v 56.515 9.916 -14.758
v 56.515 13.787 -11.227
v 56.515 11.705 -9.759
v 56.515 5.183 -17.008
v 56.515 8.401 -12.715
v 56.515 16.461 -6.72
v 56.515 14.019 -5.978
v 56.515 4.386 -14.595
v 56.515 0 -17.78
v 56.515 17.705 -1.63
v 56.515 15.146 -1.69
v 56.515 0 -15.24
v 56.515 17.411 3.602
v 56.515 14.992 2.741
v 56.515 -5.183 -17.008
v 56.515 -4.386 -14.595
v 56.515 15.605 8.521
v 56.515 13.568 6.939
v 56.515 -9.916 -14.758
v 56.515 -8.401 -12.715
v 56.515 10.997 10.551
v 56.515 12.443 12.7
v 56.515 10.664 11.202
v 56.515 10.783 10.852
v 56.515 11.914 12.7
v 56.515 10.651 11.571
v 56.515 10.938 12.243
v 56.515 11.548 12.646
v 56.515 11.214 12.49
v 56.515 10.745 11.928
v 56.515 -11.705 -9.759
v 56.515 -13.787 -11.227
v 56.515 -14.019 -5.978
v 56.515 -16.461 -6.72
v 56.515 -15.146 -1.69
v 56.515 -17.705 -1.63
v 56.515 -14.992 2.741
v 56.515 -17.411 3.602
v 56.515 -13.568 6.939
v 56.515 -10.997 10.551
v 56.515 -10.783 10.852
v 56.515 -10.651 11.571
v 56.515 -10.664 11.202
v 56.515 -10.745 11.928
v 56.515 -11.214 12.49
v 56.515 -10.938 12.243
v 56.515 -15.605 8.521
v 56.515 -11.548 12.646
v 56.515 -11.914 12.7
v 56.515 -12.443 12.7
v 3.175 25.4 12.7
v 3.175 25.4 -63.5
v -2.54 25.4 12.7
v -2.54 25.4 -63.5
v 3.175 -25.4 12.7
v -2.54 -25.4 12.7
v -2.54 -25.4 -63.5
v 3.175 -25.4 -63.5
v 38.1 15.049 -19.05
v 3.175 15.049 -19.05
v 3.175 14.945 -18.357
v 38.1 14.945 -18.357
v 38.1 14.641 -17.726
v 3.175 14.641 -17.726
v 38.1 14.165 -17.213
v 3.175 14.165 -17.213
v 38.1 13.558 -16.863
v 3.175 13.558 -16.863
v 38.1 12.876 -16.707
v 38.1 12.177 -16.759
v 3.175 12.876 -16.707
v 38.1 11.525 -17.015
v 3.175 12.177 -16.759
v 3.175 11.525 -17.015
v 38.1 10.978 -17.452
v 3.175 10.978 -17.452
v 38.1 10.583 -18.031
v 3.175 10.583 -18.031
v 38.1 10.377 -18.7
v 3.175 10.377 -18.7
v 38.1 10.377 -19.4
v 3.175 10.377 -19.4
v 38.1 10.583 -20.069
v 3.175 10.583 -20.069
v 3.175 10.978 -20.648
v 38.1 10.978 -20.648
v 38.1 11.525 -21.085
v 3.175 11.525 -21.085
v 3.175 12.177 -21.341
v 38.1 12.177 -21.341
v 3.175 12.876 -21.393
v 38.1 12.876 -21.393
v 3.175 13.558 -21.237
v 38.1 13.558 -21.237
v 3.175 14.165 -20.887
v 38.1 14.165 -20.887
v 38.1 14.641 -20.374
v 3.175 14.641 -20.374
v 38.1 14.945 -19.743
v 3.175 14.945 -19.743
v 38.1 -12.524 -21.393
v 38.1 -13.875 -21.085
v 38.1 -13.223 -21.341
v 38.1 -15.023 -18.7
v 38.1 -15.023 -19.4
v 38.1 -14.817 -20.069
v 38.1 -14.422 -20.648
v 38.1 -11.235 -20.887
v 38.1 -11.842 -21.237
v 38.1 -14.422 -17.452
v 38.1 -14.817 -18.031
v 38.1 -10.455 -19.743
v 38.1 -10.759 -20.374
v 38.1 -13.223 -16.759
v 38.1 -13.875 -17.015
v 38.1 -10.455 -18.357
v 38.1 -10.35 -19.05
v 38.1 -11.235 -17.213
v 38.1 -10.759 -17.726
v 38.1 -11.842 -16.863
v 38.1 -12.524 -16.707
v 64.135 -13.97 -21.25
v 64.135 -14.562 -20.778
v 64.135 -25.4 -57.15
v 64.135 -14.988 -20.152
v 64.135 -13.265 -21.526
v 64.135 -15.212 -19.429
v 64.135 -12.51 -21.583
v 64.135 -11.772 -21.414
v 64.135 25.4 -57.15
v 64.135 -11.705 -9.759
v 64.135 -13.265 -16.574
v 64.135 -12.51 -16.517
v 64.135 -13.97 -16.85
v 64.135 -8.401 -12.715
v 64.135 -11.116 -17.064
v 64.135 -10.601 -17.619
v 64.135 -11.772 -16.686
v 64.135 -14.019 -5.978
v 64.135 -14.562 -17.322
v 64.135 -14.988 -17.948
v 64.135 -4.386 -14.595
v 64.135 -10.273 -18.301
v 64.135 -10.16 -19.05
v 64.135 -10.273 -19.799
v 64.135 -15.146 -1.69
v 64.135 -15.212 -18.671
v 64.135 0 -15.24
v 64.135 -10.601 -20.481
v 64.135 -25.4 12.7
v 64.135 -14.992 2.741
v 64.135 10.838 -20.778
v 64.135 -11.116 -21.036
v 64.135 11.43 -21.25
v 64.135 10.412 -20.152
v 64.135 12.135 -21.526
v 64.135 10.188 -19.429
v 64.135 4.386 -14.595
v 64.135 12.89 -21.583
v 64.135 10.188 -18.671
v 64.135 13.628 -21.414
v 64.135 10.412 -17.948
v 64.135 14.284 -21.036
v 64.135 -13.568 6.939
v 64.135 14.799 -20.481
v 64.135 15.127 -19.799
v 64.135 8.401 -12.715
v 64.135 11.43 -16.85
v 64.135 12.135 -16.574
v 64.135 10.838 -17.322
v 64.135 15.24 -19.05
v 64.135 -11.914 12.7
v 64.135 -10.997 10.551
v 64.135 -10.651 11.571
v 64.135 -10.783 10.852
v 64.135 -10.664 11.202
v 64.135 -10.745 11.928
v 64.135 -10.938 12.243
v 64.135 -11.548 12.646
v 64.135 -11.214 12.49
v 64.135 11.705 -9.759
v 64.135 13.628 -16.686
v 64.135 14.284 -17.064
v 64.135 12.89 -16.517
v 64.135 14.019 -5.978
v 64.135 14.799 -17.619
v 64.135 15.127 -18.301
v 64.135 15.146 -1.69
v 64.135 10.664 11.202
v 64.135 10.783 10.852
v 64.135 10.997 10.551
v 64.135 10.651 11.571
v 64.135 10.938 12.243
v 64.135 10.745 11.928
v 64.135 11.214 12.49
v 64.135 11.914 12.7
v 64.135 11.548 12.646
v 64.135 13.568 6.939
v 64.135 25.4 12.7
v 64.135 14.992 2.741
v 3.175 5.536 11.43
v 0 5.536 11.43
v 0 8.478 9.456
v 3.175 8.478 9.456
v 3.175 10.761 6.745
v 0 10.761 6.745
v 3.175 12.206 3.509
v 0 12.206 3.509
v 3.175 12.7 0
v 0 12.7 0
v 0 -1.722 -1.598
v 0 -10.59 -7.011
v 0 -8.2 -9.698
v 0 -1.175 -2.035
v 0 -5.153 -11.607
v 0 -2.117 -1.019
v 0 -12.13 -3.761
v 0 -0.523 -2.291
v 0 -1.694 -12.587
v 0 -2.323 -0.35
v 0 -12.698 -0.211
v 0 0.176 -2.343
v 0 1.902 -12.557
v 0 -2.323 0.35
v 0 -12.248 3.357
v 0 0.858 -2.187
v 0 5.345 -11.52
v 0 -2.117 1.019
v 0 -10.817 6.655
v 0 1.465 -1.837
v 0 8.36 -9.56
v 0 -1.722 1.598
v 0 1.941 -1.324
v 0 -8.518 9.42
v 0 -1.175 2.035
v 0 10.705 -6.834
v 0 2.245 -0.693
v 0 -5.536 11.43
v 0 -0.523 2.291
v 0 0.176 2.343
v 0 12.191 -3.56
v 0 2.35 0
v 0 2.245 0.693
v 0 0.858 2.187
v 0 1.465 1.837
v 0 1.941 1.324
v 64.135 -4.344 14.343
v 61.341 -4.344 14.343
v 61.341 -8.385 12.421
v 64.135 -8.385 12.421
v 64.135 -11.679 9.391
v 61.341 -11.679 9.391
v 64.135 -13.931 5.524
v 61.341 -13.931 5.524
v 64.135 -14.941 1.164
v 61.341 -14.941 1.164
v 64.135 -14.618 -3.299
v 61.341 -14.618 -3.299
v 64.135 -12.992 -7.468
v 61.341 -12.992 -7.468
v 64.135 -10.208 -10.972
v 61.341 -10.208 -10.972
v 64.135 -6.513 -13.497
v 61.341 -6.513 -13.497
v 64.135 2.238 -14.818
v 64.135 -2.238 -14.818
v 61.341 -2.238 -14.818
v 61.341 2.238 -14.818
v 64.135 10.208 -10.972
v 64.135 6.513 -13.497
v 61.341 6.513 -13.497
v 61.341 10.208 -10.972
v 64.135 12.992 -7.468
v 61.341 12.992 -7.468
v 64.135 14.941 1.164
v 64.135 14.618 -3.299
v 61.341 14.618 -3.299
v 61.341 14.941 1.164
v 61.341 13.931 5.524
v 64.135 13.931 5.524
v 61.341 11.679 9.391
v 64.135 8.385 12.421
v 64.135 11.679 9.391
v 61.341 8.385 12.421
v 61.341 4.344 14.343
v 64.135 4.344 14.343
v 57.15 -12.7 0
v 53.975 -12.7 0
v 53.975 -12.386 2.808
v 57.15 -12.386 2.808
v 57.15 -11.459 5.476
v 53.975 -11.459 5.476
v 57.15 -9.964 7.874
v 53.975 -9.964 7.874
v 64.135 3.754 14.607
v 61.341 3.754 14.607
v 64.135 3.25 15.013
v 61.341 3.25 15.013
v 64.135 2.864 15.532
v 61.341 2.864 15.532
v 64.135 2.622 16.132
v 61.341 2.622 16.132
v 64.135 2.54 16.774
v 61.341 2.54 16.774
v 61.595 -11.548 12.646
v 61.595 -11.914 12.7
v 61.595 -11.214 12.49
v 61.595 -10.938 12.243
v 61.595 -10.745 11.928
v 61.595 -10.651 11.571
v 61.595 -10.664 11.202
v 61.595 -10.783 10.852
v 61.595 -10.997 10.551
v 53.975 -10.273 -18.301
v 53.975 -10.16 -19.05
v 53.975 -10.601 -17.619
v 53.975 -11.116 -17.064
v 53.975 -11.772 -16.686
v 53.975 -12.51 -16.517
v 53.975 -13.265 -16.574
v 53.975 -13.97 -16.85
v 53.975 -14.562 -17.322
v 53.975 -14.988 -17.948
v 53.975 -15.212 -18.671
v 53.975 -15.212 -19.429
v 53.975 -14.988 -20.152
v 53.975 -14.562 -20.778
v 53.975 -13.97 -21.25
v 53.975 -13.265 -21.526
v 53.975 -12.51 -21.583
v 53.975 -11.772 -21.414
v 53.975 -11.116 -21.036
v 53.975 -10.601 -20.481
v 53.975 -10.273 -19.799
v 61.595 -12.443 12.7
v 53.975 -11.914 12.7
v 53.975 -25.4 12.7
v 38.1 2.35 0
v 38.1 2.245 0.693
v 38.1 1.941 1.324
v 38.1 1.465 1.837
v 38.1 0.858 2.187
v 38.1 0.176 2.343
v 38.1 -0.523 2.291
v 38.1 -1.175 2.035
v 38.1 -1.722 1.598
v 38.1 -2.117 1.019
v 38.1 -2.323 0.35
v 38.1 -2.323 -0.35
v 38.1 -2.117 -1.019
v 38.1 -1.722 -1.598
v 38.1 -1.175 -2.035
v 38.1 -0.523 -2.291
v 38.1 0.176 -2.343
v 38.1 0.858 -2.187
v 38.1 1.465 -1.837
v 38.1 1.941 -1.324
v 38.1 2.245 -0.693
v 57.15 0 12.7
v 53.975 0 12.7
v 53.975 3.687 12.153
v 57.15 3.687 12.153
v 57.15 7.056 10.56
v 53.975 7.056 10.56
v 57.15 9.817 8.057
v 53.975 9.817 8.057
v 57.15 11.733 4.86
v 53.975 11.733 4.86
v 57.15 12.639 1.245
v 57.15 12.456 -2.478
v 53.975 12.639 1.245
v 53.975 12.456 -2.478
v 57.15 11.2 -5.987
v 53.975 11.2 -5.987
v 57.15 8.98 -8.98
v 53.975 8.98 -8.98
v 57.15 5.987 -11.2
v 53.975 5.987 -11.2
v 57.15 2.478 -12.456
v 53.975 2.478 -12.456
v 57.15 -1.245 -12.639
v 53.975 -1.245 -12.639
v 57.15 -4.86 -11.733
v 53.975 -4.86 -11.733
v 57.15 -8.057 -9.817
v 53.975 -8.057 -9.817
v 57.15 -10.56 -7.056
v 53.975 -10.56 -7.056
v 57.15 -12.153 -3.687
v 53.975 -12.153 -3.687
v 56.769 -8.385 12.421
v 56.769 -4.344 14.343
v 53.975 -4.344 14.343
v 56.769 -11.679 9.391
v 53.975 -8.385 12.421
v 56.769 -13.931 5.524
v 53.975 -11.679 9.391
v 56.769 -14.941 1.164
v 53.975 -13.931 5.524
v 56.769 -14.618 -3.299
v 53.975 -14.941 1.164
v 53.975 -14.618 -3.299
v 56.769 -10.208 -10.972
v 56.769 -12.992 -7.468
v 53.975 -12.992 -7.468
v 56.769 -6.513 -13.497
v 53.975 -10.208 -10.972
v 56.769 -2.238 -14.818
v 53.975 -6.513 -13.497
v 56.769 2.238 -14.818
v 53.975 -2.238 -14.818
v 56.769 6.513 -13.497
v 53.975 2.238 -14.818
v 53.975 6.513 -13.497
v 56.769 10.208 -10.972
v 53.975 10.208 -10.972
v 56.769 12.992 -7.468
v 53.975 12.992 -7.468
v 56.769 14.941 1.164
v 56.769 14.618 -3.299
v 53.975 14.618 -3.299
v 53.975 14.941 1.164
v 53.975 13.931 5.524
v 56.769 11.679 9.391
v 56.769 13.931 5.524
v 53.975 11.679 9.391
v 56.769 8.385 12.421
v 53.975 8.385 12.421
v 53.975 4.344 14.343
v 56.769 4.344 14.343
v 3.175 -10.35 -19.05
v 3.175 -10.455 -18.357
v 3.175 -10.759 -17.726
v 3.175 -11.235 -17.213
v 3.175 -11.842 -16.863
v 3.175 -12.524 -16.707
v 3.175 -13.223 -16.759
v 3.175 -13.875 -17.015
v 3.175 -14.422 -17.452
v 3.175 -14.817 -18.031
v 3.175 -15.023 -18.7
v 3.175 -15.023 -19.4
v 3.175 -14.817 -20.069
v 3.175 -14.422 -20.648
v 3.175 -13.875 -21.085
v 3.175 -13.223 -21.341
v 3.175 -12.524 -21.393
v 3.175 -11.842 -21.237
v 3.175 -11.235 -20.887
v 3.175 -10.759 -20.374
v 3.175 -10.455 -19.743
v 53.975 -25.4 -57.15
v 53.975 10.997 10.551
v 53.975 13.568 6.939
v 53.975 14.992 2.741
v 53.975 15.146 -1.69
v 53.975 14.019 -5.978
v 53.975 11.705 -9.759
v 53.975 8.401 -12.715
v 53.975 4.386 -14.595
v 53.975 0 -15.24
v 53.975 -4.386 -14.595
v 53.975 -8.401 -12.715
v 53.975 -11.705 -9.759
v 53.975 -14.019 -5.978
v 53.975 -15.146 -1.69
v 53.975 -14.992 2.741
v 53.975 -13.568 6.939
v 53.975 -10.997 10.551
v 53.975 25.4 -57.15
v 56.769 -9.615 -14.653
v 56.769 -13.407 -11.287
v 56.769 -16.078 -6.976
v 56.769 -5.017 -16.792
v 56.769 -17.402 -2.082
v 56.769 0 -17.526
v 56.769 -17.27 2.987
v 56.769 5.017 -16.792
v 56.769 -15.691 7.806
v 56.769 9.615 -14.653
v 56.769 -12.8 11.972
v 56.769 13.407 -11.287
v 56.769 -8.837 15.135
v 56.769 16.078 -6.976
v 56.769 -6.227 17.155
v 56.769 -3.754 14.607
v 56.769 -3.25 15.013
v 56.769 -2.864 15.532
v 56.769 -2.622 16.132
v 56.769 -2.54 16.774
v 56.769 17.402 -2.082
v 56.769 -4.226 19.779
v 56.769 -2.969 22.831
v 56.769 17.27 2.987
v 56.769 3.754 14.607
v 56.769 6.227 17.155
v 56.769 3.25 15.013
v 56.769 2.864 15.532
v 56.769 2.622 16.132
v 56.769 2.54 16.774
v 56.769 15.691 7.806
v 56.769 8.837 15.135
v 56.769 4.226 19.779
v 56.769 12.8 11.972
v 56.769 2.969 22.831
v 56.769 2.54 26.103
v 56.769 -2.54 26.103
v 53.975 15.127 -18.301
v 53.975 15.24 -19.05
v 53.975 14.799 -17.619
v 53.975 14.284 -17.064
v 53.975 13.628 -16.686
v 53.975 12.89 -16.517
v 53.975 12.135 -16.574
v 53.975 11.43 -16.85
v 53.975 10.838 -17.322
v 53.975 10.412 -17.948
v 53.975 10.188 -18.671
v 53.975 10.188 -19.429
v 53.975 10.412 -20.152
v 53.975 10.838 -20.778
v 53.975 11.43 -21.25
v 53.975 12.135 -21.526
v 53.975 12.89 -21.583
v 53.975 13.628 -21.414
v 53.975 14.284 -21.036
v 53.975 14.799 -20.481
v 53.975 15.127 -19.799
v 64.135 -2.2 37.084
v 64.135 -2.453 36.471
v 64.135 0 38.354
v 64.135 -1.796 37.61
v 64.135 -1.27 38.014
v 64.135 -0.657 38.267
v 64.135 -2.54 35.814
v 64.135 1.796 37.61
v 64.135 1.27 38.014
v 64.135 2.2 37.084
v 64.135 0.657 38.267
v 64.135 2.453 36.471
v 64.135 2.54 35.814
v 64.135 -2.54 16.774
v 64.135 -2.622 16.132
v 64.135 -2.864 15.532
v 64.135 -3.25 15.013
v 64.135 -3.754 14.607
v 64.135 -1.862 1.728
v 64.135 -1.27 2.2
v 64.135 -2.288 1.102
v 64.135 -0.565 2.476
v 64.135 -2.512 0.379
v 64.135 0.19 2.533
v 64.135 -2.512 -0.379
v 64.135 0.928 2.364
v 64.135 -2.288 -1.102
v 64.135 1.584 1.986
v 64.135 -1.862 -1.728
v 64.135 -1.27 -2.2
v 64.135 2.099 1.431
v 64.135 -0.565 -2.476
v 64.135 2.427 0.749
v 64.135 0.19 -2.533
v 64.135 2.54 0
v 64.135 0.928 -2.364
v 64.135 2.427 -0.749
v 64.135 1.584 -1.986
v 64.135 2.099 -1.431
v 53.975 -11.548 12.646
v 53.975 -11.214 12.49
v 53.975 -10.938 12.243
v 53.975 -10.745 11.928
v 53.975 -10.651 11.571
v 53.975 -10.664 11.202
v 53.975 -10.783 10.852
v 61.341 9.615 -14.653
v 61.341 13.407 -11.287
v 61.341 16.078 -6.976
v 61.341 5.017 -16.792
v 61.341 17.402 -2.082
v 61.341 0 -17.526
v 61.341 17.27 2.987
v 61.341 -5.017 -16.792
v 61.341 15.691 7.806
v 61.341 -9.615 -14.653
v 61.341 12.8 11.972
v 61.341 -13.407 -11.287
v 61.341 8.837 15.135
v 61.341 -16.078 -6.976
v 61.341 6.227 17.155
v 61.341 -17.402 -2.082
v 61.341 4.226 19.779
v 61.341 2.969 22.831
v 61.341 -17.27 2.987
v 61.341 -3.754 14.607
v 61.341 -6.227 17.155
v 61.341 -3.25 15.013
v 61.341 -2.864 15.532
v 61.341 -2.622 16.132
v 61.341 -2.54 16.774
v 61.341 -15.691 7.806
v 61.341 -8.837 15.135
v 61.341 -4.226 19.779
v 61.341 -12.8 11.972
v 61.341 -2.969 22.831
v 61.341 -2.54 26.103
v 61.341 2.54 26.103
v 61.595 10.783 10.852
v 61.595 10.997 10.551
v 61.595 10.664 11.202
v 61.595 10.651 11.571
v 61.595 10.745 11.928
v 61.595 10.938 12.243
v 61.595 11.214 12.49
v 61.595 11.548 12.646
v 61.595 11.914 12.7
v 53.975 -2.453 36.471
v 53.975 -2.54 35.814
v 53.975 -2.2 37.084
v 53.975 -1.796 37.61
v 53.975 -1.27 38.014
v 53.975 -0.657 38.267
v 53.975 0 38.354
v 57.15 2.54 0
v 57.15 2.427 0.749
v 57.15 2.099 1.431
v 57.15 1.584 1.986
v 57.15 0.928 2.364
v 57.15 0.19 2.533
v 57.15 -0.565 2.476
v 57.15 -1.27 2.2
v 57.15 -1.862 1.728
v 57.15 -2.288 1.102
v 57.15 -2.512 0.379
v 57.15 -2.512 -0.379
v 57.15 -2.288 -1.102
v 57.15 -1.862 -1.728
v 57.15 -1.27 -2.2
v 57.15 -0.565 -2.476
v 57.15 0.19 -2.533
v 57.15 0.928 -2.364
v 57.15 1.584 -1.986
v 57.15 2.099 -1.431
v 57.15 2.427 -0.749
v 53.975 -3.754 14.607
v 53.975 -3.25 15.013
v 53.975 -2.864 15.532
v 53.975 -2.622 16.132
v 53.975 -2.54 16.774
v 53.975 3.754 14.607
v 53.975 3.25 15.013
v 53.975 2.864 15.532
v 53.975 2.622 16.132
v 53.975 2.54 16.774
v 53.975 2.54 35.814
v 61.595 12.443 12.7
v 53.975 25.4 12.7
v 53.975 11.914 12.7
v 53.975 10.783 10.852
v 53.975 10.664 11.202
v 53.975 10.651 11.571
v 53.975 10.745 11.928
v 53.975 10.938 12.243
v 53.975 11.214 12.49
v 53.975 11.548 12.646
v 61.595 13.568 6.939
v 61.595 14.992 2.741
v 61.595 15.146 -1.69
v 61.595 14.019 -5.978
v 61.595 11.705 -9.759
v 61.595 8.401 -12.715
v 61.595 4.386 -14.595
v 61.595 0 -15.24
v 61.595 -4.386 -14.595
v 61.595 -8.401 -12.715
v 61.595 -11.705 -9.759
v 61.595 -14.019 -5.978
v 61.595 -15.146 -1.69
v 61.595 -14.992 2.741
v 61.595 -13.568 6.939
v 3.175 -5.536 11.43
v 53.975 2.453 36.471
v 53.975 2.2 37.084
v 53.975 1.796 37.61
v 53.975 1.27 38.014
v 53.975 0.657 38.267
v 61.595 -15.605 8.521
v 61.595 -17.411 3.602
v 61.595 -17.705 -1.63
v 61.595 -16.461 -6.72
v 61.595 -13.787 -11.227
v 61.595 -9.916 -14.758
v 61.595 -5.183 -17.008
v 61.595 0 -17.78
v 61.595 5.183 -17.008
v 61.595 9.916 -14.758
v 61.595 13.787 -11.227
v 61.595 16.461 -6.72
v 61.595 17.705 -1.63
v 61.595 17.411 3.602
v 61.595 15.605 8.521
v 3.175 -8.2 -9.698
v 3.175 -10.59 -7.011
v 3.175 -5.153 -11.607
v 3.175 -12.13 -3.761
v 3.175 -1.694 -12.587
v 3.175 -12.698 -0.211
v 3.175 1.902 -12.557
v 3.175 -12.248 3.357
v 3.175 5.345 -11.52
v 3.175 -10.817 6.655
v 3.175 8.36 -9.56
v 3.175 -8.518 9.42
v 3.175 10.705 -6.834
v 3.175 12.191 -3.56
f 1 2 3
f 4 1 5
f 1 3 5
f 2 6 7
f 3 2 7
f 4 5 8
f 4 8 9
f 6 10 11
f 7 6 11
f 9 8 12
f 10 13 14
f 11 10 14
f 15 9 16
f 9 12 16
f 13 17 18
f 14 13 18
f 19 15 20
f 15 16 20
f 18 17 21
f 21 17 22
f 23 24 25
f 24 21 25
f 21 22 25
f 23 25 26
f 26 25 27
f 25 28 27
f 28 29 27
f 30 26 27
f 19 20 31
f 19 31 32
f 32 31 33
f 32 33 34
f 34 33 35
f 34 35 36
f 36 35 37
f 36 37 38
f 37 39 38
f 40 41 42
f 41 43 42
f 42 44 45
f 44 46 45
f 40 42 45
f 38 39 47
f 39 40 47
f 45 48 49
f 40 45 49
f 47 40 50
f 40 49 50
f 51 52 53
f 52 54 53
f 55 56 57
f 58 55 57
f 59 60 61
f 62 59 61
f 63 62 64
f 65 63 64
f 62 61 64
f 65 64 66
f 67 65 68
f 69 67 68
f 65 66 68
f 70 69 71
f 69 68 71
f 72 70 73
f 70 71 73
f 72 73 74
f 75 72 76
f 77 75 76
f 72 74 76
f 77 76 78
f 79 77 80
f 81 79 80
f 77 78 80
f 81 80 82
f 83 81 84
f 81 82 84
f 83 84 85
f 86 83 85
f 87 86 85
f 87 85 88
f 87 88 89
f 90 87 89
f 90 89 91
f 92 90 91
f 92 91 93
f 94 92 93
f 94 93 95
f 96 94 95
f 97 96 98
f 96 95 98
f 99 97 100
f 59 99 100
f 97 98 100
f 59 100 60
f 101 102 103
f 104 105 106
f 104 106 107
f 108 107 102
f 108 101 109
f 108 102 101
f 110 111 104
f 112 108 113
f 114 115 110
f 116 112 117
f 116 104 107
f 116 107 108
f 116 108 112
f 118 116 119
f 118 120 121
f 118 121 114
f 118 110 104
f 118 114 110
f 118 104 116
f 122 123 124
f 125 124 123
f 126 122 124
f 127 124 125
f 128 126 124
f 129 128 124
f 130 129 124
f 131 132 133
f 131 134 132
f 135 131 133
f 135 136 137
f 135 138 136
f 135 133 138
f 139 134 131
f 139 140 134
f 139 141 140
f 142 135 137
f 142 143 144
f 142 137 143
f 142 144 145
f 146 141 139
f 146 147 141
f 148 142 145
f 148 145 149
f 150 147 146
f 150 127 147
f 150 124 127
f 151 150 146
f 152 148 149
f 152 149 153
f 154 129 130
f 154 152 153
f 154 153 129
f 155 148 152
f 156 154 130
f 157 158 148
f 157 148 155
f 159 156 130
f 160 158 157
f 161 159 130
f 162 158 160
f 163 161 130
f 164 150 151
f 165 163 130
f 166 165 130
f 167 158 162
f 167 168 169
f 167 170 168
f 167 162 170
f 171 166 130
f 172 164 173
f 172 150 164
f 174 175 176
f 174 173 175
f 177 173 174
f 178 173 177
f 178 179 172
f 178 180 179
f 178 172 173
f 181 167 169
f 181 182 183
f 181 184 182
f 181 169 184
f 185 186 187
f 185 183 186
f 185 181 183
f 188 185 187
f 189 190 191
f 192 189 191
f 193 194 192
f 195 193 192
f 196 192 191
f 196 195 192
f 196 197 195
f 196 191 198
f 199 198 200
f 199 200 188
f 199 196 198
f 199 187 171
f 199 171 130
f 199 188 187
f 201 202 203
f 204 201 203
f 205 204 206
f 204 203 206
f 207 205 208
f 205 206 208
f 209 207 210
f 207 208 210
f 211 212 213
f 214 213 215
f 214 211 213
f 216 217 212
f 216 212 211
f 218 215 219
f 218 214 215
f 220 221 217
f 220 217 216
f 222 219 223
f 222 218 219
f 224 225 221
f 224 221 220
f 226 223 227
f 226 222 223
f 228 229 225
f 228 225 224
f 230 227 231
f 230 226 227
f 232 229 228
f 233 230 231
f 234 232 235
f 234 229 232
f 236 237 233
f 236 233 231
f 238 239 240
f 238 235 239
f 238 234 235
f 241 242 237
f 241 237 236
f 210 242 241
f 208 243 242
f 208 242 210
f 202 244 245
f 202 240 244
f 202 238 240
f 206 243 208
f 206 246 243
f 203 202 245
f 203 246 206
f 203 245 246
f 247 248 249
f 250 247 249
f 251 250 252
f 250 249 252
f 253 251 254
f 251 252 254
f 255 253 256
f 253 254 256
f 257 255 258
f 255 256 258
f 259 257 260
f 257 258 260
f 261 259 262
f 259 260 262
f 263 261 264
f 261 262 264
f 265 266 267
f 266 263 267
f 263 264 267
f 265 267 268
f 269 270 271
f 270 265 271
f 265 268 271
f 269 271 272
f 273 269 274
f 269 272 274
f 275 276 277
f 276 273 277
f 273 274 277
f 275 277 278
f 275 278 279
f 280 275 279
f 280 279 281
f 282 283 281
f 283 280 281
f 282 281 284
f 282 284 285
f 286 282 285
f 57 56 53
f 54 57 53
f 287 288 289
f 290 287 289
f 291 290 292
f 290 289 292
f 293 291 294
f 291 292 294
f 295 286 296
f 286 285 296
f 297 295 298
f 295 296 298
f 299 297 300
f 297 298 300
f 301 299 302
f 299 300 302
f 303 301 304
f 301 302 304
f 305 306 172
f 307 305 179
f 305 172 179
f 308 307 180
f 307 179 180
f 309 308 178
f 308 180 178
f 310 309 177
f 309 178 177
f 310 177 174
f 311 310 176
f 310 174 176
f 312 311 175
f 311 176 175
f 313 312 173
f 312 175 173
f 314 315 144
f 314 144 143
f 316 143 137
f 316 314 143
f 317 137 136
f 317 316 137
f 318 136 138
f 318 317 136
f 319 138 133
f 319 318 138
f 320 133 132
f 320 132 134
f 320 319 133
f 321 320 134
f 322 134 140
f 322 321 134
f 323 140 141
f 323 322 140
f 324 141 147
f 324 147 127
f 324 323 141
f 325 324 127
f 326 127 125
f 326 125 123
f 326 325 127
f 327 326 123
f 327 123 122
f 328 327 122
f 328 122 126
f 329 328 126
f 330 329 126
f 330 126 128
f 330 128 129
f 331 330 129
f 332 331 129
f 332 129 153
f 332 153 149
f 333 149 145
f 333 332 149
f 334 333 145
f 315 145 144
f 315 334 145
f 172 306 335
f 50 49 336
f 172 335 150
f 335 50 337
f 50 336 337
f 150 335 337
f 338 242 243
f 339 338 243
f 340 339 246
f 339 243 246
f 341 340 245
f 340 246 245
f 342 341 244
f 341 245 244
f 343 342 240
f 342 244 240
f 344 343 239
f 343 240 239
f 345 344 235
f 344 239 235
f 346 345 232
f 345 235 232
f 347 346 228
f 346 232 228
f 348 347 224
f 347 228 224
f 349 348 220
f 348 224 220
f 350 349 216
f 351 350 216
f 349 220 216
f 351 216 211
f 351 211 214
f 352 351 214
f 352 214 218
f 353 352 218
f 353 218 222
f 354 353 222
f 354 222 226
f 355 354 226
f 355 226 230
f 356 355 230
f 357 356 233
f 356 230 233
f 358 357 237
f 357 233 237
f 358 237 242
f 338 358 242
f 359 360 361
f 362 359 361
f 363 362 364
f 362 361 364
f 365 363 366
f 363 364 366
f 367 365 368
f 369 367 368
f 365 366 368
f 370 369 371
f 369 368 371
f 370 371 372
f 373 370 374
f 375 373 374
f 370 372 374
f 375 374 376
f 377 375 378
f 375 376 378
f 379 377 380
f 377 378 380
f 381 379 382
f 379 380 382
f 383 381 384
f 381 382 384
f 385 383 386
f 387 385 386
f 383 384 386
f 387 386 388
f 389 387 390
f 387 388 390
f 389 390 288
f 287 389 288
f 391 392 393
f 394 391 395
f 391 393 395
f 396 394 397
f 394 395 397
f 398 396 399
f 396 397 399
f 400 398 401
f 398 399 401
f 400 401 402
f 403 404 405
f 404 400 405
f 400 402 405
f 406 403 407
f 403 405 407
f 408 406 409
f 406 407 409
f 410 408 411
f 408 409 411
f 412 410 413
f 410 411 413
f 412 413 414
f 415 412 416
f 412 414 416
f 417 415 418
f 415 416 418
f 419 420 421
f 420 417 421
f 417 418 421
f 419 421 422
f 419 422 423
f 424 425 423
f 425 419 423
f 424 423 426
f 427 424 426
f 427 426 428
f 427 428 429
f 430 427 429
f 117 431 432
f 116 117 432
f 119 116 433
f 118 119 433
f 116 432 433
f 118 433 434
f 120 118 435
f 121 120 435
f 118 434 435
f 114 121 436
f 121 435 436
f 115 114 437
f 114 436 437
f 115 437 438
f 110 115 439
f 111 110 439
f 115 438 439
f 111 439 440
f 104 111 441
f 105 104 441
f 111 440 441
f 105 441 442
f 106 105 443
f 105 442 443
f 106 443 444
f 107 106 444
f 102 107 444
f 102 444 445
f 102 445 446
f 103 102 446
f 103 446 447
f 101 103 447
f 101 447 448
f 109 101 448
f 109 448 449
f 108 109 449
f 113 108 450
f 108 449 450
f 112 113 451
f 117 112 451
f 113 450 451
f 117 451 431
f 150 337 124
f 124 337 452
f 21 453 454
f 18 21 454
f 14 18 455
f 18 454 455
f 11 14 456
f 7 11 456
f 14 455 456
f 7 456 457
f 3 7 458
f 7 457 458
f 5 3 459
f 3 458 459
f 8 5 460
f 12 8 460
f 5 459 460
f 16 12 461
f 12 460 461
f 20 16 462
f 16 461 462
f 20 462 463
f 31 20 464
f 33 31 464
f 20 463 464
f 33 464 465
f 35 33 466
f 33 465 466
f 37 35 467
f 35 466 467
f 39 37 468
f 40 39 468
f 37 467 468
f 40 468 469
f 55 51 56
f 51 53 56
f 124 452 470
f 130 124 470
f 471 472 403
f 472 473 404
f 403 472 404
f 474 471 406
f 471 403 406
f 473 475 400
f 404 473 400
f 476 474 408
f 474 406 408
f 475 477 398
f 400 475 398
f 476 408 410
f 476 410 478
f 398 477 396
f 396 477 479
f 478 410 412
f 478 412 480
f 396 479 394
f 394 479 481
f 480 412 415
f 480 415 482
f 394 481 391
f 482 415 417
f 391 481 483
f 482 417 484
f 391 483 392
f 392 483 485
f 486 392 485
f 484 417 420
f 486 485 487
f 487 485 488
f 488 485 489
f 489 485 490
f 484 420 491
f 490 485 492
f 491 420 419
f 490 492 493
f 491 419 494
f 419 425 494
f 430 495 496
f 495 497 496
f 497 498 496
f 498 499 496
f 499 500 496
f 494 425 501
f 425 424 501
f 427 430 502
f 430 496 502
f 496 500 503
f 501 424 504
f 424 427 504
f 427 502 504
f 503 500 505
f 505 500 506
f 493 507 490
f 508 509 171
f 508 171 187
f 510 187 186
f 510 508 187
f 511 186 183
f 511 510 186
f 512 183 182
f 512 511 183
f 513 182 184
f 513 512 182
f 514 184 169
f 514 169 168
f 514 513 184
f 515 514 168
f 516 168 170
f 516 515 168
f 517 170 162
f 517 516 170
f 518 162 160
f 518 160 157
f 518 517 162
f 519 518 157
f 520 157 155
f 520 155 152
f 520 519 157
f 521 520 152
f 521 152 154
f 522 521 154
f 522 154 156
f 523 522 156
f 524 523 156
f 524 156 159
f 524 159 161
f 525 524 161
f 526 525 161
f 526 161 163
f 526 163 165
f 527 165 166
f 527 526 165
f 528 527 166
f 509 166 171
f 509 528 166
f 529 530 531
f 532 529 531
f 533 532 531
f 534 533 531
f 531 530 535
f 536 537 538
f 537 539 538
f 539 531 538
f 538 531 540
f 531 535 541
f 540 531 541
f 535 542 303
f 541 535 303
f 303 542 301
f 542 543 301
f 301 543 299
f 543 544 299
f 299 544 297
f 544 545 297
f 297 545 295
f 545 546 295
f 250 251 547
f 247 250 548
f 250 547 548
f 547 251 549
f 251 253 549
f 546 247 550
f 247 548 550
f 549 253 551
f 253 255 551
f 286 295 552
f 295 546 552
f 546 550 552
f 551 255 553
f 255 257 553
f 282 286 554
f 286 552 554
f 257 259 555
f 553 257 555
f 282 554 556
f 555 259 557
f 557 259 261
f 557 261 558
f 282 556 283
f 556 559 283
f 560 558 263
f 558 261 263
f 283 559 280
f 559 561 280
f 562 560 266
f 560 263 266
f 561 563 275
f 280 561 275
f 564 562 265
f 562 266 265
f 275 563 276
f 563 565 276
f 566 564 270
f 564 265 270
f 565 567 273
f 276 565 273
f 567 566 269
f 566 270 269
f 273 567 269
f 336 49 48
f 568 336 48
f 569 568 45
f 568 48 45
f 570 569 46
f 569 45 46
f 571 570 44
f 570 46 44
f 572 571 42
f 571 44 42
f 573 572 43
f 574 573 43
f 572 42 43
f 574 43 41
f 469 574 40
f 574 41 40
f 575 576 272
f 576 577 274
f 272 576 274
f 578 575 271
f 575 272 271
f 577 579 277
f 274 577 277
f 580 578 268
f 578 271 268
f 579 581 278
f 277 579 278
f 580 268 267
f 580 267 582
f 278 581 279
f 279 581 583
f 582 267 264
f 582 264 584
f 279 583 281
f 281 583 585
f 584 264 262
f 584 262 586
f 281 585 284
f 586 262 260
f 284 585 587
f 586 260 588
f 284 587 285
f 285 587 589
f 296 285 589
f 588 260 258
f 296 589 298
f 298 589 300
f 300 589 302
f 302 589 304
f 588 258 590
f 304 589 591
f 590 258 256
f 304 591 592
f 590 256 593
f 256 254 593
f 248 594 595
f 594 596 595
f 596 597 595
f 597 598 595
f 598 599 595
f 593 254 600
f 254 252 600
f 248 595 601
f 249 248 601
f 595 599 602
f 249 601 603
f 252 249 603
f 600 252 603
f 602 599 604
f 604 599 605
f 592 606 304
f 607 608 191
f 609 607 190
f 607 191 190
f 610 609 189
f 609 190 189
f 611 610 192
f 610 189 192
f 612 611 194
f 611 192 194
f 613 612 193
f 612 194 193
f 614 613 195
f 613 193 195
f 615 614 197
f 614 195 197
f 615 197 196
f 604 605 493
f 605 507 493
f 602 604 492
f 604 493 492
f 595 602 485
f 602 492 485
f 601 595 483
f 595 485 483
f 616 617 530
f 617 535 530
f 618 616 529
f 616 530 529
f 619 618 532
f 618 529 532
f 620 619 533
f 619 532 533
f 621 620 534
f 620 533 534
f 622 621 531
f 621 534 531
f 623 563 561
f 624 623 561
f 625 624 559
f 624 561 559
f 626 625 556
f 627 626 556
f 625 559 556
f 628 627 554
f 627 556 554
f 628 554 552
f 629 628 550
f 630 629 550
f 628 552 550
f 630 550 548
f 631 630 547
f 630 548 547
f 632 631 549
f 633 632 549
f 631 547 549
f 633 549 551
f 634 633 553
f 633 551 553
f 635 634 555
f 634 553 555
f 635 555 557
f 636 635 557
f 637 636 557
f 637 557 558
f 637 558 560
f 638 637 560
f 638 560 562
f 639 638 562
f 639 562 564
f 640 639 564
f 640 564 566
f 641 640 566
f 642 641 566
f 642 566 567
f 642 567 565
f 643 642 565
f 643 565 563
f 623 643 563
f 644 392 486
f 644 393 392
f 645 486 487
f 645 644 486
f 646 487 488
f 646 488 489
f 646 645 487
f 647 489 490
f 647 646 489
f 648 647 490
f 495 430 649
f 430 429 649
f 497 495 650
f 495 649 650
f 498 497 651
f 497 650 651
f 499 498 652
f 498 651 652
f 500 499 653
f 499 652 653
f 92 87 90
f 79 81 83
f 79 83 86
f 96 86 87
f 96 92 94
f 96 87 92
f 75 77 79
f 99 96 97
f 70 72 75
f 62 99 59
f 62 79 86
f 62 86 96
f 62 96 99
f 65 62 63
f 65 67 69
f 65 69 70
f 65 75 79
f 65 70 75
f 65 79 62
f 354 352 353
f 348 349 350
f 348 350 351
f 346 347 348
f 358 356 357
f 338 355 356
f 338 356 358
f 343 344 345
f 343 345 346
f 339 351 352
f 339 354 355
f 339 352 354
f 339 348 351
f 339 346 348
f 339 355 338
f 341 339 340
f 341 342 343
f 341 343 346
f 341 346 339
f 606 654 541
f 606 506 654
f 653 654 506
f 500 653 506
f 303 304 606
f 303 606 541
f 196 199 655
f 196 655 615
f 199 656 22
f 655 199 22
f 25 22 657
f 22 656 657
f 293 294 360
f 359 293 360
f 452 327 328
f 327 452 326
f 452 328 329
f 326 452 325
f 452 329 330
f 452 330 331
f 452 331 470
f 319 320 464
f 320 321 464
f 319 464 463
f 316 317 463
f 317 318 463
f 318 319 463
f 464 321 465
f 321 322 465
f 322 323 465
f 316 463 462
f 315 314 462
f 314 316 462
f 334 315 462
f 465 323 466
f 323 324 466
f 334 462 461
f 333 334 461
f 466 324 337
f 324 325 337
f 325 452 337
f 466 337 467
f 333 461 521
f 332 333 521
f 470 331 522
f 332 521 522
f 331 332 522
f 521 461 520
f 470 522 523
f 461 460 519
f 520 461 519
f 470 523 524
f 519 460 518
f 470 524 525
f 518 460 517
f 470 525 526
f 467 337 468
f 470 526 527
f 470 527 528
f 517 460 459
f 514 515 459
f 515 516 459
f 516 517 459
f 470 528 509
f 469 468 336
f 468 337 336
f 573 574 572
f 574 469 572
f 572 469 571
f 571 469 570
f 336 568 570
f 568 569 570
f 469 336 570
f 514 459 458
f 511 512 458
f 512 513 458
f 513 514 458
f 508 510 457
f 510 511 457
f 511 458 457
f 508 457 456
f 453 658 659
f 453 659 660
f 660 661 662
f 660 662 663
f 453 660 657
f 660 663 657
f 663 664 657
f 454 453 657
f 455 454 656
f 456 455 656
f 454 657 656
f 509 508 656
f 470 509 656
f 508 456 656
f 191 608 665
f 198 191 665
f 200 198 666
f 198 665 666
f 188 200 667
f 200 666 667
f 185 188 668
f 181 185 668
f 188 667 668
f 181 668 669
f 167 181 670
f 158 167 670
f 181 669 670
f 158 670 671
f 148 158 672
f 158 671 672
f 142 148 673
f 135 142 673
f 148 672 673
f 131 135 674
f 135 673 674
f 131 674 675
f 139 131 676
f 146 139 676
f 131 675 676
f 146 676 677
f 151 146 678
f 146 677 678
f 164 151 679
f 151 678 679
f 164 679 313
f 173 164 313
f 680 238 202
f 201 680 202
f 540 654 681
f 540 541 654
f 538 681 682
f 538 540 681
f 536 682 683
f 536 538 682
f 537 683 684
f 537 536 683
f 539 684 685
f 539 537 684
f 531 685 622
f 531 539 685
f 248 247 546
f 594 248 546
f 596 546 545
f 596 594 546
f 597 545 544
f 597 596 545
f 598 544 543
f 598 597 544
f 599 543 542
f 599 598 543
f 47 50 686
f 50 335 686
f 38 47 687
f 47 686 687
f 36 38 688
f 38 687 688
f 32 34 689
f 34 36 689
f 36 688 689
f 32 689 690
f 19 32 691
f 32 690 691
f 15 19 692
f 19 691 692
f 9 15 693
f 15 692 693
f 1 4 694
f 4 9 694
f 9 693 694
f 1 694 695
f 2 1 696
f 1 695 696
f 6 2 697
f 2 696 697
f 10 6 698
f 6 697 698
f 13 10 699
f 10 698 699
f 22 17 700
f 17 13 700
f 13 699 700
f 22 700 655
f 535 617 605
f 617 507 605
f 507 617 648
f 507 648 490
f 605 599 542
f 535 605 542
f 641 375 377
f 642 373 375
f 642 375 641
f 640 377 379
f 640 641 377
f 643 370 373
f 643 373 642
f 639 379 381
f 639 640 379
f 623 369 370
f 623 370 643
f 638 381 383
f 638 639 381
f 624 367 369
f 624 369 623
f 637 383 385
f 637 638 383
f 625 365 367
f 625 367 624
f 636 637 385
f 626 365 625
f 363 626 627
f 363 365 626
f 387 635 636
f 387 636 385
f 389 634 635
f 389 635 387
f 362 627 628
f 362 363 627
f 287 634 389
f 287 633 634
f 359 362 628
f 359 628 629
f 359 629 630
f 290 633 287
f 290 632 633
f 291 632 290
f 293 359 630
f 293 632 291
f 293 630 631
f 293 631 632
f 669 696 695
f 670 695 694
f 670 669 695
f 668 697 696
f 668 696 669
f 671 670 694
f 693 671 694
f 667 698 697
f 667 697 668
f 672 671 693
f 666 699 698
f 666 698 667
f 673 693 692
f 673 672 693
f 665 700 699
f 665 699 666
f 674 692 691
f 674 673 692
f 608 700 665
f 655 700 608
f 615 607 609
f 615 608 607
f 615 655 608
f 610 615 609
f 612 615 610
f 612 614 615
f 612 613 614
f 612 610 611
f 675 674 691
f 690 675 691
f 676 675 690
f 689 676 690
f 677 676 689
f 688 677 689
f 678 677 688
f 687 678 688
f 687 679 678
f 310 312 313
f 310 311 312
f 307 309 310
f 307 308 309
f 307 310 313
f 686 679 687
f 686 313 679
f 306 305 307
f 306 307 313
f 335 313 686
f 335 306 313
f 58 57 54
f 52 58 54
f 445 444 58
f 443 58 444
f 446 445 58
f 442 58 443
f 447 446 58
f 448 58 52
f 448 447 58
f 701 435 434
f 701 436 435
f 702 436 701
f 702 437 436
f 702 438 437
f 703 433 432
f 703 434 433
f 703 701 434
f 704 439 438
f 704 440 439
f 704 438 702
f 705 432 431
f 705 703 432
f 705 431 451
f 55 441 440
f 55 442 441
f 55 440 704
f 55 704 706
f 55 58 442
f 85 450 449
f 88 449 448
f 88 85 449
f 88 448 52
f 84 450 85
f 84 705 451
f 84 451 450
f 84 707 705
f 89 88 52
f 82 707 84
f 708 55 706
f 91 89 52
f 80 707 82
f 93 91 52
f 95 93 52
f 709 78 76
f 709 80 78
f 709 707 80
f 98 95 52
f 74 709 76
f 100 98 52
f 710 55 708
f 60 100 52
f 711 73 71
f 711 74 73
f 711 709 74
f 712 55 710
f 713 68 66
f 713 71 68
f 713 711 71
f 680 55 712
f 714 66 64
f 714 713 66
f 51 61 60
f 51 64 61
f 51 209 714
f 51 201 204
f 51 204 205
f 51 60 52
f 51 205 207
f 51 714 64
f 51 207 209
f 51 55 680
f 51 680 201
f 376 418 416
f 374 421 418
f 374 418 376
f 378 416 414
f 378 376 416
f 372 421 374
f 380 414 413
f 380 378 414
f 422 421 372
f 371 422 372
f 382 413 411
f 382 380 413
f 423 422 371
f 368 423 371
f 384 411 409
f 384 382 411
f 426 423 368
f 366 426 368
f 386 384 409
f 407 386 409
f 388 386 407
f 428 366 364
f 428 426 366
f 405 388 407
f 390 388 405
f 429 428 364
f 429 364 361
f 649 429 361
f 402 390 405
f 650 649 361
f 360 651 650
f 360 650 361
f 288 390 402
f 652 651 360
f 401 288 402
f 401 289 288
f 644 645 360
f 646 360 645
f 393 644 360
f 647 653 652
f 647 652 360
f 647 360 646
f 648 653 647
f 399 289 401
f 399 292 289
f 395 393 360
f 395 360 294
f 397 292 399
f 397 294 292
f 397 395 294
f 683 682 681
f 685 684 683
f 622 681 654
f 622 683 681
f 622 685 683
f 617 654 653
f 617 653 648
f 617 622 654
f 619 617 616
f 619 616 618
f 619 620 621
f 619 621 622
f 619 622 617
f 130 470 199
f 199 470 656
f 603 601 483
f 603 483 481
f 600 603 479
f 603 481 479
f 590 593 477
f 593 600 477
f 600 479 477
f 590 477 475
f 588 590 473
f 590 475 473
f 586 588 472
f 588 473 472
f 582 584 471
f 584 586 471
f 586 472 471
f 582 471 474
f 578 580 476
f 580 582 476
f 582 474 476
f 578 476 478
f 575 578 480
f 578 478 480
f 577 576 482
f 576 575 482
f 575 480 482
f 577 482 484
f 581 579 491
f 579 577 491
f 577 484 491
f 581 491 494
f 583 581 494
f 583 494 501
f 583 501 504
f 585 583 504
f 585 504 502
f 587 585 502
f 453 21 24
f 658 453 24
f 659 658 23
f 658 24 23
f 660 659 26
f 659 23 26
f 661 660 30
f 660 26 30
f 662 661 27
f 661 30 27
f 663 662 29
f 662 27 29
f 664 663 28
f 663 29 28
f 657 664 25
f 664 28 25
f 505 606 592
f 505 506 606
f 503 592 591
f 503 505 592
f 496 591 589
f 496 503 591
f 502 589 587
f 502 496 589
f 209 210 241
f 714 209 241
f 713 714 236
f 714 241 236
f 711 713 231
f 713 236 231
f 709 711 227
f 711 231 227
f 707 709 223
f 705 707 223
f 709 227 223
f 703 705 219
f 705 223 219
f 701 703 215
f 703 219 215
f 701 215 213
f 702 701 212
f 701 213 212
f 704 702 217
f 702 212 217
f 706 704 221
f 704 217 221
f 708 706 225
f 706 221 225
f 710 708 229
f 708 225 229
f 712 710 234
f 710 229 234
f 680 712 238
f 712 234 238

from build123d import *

# Parameters (mm, degrees)
F0_R      = 2.3495
F1_DEPTH  = 38.1
F2_W      = 50.8
F2_H      = 76.2
F3_DEPTH  = 2.54
F5_DEPTH  = 3.175
F6_R      = 2.3495
F7_DEPTH  = 34.925
F9_R      = 2.54
F10_DEPTH = 10.16
F11_R     = 1.27
F12_W     = 5.08
F12_H     = 9.2631512689
F14_W     = 2.54
F14_H     = 14.986
F16_R     = 2.54
F17_DEPTH = 10.16
F18_R     = 2.54
F19_DEPTH = 3.175
F21_W     = 10.16
F21_H     = 5.08
F22_DEPTH = 25.4
F23_R     = 2.54
F24_R     = 12.7
F25_R     = 2.53999


# Not quite as in the source:
# - a fillet or chamfer is up to 0.001 mm smaller than in the source, because OpenCascade refuses the exact size
# - a feature names something its author has since deleted; it is built from what else it names


with BuildPart() as f1:
    # F0 (on Right) → F1 (new body)
    with BuildSketch(Plane.YZ):
        Circle(F0_R)
    extrude(amount=F1_DEPTH)

    # F2 (on Right) → F3 (join)
    with BuildSketch(Plane.YZ):
        with Locations((0, -25.4)):
            Rectangle(F2_W, F2_H)
    extrude(amount=-F3_DEPTH)

    # F4 (on face) → F5 (join)
    with BuildSketch(Plane.YZ):
        Polygon((25.4, 12.7), (0, 12.7), (-25.4, 12.7), (-25.4, -63.5), (25.4, -63.5), align=None)
        with BuildLine():
            ThreePointArc((5.5358016583, 11.43), (10.7609172718, 6.7448246434), (12.7, 0))
            ThreePointArc((12.7, 0), (-6.7448246434, -10.7609172718), (-5.5358016583, 11.43))
            ThreePointArc((-5.5358016583, 11.43), (-2.8398063314, 12.3784288179), (0, 12.7))
            ThreePointArc((0, 12.7), (2.8398063314, 12.3784288179), (5.5358016583, 11.43))
        make_face(mode=Mode.SUBTRACT)
        with BuildLine():
            Line((-5.5358016583, 11.43), (5.5358016583, 11.43))
            ThreePointArc((5.5358016583, 11.43), (2.8398063314, 12.3784288179), (0, 12.7))
            ThreePointArc((0, 12.7), (-2.8398063314, 12.3784288179), (-5.5358016583, 11.43))
        make_face()
    extrude(amount=F5_DEPTH)

    # F6 (on face) → F7 (join, through all)
    with BuildSketch(Plane.YZ.offset(3.175)):
        with Locations((-12.7, -19.05)):
            Circle(F6_R)
        with Locations((12.7, -19.05)):
            Circle(F6_R)
    extrude(amount=F7_DEPTH)


with BuildPart() as f10:
    # F9 (on offset) → F10 (new body)
    with BuildSketch(Plane.YZ.offset(53.975)):
        with BuildLine():
            Line((-25.4, 12.7), (-25.4, -57.15))
            Line((-25.4, -57.15), (25.4, -57.15))
            Line((25.4, -57.15), (25.4, 12.7))
            Line((25.4, 12.7), (8.4242269675, 12.7))
            ThreePointArc((8.4242269675, 12.7), (13.4283807472, 7.2066768006), (15.24, 0))
            ThreePointArc((15.24, 0), (-7.2066768006, -13.4283807472), (-8.4242269675, 12.7))
            Line((-8.4242269675, 12.7), (-25.4, 12.7))
        make_face()
        with Locations((-12.7, -19.05)):
            Circle(F9_R, mode=Mode.SUBTRACT)
        with Locations((12.7, -19.05)):
            Circle(F9_R, mode=Mode.SUBTRACT)
    extrude(amount=F10_DEPTH)

    # F11
    f11_edges = [f10.edges().sort_by_distance(p)[0] for p in [
        (59.055, 8.424227, 12.7),
        (59.055, -8.424227, 12.7),
    ]]
    fillet(f11_edges, radius=F11_R)

    # F12 (on Top) → F13 (revolve, cut)
    with BuildSketch(Plane.XY):
        with Locations((59.055, 13.1484243655)):
            Rectangle(F12_W, F12_H)
    revolve(axis=Axis((28.3873360604, 0, 0), (1, 0, 0)), mode=Mode.SUBTRACT)


with BuildPart() as f15:
    # F14 (on Top) → F15 (revolve)
    with BuildSketch(Plane.XY):
        with Locations((55.245, 7.493)):
            Rectangle(F14_W, F14_H)
        Polygon((56.769, 14.986), (56.515, 14.986), (56.515, 0), (61.595, 0), (61.595, 14.986), (61.341, 14.986), (61.341, 17.526), (56.769, 17.526), align=None)
        with Locations((62.865, 7.493)):
            Rectangle(F14_W, F14_H)
    revolve(axis=Axis((59.055, 0, 0), (1, 0, 0)))

    # F16 (on face) → F17 (cut, through all)
    with BuildSketch(Plane.YZ.offset(64.135)):
        Circle(F16_R)
    extrude(amount=-F17_DEPTH, mode=Mode.SUBTRACT)

    # F18 (on face) → F19 (cut)
    with BuildSketch(Plane(origin=(53.975, 0, 0), x_dir=(0, -1, 0), z_dir=(-1, 0, 0))):
        with BuildLine():
            ThreePointArc((0, 12.7), (-8.9802561211, -8.9802561211), (12.7, 0))
            ThreePointArc((12.7, 0), (11.9966334008, 4.1678276171), (9.9644429849, 7.874))
            Line((9.9644429849, 7.874), (0, 12.7))
        make_face()
        Circle(F18_R, mode=Mode.SUBTRACT)
    extrude(amount=-F19_DEPTH, mode=Mode.SUBTRACT)

    # F21 (on offset) → F22 (join)
    with BuildSketch(Plane.XY.offset(12.954)):
        with Locations((59.055, 0)):
            Rectangle(F21_W, F21_H)
    extrude(amount=F22_DEPTH)

    # F23
    f23_edges = [f15.edges().sort_by_distance(p)[0] for p in [
        (62.738, -2.54, 14.769177),
        (62.738, 2.54, 14.769177),
        (55.372, -2.54, 14.769177),
        (55.372, 2.54, 14.769177),
    ]]
    fillet(f23_edges, radius=F23_R)

    # F24
    f24_edges = [f15.edges().sort_by_distance(p)[0] for p in [
        (59.055, 2.54, 17.340965),
        (59.055, -2.54, 17.340965),
    ]]
    fillet(f24_edges, radius=F24_R)

    # F25 (radius 2.54 in the source; OpenCascade refuses exactly that, so slightly less here)
    f25_edges = [f15.edges().sort_by_distance(p)[0] for p in [
        (59.055, -2.54, 38.354),
        (59.055, 2.54, 38.354),
    ]]
    fillet(f25_edges, radius=F25_R)


solid = Compound([f1.part, f10.part, f15.part])
